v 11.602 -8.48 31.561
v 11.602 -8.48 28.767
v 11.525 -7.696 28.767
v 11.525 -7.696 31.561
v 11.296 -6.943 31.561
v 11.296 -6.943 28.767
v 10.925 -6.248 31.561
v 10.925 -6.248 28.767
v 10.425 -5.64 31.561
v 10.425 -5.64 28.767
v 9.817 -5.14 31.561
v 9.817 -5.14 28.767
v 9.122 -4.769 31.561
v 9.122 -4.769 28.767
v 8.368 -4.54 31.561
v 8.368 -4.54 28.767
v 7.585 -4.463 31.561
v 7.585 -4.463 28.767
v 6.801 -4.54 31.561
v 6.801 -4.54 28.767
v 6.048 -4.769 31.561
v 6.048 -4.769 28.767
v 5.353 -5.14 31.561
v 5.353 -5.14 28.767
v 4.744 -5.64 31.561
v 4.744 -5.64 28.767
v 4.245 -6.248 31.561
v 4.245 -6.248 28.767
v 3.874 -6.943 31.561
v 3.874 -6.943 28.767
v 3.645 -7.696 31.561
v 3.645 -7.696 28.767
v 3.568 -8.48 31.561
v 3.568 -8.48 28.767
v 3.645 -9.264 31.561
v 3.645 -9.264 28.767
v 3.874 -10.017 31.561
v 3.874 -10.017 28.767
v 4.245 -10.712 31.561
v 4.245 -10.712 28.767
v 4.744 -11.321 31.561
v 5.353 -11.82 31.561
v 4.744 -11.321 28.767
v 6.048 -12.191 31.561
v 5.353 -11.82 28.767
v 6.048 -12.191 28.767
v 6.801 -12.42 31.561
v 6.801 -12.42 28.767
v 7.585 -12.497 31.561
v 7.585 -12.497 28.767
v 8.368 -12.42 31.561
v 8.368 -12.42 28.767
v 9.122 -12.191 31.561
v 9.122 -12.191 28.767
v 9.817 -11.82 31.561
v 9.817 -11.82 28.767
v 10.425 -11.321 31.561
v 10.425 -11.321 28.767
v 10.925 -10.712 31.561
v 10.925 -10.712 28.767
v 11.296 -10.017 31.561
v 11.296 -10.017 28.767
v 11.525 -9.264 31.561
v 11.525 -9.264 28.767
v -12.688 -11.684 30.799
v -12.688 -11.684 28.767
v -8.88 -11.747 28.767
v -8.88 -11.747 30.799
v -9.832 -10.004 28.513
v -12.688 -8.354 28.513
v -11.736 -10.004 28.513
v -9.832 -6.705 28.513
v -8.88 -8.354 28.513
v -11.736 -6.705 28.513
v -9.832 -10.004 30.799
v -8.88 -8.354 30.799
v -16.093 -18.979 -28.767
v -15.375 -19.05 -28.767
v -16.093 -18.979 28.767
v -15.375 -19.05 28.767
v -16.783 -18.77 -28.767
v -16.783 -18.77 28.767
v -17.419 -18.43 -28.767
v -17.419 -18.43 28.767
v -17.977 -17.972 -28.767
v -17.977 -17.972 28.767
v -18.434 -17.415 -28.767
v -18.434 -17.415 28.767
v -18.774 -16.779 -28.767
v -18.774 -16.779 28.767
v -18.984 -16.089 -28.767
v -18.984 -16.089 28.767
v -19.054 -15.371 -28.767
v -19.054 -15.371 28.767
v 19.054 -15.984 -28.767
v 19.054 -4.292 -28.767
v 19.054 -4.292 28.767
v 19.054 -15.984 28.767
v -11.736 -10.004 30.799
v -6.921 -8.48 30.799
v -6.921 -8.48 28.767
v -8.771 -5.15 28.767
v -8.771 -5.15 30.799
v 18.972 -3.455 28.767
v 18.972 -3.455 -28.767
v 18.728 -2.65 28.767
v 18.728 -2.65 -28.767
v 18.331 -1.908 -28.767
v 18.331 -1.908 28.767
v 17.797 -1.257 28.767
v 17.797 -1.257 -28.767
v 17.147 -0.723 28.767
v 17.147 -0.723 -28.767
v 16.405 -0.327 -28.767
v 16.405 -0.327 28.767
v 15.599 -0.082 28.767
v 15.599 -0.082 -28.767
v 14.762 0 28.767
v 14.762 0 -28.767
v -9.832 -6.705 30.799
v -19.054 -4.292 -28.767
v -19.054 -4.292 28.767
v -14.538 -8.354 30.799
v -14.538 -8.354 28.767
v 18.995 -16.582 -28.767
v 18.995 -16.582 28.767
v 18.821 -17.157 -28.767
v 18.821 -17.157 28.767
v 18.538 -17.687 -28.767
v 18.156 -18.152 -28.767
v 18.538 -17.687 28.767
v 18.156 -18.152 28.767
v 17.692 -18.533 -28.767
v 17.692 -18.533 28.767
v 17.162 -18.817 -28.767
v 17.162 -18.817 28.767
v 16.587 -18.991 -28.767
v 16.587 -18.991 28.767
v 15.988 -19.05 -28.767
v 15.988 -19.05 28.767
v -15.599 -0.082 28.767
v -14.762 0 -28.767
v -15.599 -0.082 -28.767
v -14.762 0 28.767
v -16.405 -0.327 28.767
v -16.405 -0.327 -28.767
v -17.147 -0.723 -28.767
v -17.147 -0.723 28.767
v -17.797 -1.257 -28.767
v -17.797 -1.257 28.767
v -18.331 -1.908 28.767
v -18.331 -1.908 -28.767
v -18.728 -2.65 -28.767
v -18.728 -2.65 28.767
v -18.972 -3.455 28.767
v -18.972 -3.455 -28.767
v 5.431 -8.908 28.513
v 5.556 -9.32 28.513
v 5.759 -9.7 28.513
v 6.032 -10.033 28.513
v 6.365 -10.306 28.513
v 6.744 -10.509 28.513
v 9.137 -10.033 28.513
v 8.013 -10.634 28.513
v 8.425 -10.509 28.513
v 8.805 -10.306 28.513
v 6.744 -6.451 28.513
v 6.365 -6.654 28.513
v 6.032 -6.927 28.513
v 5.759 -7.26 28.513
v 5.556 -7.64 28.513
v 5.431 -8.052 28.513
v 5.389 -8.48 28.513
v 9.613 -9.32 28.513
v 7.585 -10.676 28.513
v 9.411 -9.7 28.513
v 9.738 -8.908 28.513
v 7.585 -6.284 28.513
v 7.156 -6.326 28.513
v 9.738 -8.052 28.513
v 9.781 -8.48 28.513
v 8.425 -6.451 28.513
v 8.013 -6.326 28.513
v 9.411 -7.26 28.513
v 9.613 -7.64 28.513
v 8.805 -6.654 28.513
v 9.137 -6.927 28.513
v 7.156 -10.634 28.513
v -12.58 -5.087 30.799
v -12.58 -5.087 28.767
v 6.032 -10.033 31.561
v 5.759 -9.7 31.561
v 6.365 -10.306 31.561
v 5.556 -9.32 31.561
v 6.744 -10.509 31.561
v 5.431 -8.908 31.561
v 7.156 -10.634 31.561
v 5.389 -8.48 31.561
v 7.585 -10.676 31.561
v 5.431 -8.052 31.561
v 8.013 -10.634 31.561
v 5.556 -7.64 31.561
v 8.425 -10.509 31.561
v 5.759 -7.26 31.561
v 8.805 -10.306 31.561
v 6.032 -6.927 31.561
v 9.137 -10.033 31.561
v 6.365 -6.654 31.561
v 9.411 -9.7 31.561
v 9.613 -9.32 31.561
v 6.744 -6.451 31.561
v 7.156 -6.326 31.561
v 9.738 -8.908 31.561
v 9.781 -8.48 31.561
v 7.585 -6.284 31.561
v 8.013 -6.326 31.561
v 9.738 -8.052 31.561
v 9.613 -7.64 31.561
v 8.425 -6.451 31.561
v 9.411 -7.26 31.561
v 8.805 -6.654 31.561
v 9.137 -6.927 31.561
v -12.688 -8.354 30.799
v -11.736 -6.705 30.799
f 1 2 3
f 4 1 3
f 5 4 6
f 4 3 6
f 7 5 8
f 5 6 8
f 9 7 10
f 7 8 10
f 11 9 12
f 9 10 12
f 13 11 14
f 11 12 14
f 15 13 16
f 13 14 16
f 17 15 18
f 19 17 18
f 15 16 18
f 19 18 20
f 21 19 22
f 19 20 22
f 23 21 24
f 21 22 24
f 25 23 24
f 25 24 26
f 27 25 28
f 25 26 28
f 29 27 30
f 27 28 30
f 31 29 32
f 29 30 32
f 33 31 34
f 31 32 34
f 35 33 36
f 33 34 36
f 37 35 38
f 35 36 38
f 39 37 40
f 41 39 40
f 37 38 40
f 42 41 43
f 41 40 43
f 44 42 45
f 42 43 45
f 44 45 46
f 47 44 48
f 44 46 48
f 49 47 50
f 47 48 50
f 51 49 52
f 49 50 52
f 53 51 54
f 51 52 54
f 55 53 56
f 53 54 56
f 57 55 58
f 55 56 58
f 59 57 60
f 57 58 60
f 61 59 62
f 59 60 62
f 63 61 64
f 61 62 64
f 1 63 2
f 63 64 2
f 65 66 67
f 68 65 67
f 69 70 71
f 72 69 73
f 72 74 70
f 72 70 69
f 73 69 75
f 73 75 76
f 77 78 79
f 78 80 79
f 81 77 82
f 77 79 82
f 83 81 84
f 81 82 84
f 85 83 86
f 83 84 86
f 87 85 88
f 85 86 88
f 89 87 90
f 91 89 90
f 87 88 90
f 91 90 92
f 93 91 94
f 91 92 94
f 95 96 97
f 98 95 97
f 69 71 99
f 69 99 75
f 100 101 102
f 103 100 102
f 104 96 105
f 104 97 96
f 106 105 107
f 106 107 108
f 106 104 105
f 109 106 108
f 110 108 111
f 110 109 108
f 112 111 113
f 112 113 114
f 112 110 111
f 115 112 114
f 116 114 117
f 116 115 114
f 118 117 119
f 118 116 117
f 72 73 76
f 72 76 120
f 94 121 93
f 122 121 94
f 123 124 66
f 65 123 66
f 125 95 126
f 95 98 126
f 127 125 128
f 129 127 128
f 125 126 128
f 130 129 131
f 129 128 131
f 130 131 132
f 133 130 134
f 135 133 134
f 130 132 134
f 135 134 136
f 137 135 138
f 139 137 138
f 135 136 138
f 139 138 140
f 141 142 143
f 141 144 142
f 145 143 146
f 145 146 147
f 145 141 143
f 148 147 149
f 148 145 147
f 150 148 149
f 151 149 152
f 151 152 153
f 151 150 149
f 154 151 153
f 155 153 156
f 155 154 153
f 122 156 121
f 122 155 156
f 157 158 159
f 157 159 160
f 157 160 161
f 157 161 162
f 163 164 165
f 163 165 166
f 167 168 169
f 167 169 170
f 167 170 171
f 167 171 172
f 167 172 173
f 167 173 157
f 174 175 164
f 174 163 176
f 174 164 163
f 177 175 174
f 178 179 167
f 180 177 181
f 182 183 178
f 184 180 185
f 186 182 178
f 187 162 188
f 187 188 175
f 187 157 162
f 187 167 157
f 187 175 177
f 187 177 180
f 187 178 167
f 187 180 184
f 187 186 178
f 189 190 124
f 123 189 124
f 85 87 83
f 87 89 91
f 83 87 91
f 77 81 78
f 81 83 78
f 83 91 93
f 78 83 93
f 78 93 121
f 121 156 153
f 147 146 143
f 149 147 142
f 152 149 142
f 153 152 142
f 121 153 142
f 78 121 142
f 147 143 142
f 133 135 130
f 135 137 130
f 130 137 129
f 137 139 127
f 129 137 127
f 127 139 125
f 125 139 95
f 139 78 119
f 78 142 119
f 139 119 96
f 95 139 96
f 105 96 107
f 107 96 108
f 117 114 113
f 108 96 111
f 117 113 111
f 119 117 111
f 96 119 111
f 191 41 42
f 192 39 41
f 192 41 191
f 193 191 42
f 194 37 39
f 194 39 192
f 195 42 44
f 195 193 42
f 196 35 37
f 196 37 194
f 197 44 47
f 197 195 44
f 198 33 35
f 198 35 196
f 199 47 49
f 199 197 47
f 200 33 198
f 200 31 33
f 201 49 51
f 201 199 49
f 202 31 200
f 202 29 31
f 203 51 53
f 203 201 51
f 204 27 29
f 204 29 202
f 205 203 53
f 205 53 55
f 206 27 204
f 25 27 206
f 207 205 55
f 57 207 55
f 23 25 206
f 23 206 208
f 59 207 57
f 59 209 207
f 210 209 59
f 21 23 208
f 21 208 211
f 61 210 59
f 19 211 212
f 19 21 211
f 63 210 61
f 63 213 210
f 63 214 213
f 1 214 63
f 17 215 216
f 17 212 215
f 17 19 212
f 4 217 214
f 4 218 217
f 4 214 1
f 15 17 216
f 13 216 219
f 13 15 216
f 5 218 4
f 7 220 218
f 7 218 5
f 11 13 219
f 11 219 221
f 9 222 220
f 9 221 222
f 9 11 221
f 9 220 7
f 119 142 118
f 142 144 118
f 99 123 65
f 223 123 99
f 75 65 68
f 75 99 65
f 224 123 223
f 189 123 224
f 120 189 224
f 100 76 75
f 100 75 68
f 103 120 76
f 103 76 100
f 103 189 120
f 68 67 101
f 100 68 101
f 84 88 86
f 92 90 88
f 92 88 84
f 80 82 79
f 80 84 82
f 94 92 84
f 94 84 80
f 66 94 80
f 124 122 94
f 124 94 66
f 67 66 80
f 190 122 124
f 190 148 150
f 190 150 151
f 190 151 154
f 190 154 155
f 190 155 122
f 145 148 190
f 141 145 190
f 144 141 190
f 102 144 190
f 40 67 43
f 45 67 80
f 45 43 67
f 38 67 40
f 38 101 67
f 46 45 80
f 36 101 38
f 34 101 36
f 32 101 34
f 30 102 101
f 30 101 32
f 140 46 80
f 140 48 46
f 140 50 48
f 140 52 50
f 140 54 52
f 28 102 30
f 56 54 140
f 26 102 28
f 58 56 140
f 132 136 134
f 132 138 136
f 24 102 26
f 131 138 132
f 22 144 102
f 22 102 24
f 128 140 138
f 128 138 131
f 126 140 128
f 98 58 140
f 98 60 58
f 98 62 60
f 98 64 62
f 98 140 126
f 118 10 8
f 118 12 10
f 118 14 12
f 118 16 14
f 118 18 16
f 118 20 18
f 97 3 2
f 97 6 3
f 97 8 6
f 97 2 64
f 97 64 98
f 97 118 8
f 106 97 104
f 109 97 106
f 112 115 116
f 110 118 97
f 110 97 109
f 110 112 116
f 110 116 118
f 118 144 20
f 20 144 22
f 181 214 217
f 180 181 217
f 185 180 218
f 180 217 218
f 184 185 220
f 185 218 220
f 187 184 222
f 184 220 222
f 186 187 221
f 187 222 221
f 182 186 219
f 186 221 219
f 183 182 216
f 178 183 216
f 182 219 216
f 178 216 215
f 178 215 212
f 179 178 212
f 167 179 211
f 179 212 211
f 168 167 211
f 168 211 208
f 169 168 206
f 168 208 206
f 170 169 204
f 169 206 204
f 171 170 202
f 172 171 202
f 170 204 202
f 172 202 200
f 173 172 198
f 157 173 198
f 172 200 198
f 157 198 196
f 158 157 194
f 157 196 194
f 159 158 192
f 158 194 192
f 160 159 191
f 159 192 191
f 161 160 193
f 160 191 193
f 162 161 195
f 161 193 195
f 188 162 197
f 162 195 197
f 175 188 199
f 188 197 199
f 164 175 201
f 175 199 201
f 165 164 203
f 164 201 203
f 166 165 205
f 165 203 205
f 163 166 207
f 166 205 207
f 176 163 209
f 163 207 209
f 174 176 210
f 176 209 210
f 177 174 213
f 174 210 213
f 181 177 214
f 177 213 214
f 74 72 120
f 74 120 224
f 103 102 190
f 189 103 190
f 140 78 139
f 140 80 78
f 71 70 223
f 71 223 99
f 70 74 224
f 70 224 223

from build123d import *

# Parameters (mm, degrees)
F0_W      = 38.10881
F0_H      = 57.533204
F1_DEPTH  = 19.05
F2_R      = 3.066051
F3_R      = 3.679261
F4_R      = 4.292472
F5_R      = 4.292472
F7_DEPTH  = 2.032
F8_R      = 4.017034
F9_DEPTH  = 2.794
F11_DEPTH = 2.286
F12_R     = 2.195821
F13_DEPTH = 3.048


with BuildPart() as f1:
    # F0 (on Front) → F1 (new body)
    with BuildSketch(Plane.XZ):
        Rectangle(F0_W, F0_H)
    extrude(amount=F1_DEPTH)

    # F2
    f2_edges = [f1.edges().sort_by_distance(p)[0] for p in [
        (19.054405, -19.05, 0),
    ]]
    fillet(f2_edges, radius=F2_R)

    # F3
    f3_edges = [f1.edges().sort_by_distance(p)[0] for p in [
        (-19.054405, -19.05, 0),
    ]]
    fillet(f3_edges, radius=F3_R)

    # F4
    f4_edges = [f1.edges().sort_by_distance(p)[0] for p in [
        (19.054405, 0, 0),
    ]]
    fillet(f4_edges, radius=F4_R)

    # F5
    f5_edges = [f1.edges().sort_by_distance(p)[0] for p in [
        (-19.054405, 0, 0),
    ]]
    fillet(f5_edges, radius=F5_R)

    # F6 (on face) → F7 (join)
    with BuildSketch(Plane.XY.offset(28.766602)):
        Polygon((-12.688468, -11.684282), (-8.879722, -11.747133), (-6.920919, -8.480087), (-8.770862, -5.150191), (-12.579608, -5.08734), (-14.538411, -8.354386), align=None)
    extrude(amount=F7_DEPTH)

    # F8 (on face) → F9 (join)
    with BuildSketch(Plane.XY.offset(28.766602)):
        with Locations((7.584764, -8.480087)):
            Circle(F8_R)
    extrude(amount=F9_DEPTH)

    # F10 (on face) → F11 (cut)
    with BuildSketch(Plane.XY.offset(30.798602)):
        Polygon((-9.831909, -10.003621), (-8.879722, -8.354386), (-9.831909, -6.70515), (-11.736282, -6.70515), (-12.688468, -8.354386), (-11.736282, -10.003621), align=None)
    extrude(amount=-F11_DEPTH, mode=Mode.SUBTRACT)

    # F12 (on face) → F13 (cut)
    with BuildSketch(Plane.XY.offset(31.560602)):
        with Locations((7.584764, -8.480087)):
            Circle(F12_R)
    extrude(amount=-F13_DEPTH, mode=Mode.SUBTRACT)


solid = f1.part
